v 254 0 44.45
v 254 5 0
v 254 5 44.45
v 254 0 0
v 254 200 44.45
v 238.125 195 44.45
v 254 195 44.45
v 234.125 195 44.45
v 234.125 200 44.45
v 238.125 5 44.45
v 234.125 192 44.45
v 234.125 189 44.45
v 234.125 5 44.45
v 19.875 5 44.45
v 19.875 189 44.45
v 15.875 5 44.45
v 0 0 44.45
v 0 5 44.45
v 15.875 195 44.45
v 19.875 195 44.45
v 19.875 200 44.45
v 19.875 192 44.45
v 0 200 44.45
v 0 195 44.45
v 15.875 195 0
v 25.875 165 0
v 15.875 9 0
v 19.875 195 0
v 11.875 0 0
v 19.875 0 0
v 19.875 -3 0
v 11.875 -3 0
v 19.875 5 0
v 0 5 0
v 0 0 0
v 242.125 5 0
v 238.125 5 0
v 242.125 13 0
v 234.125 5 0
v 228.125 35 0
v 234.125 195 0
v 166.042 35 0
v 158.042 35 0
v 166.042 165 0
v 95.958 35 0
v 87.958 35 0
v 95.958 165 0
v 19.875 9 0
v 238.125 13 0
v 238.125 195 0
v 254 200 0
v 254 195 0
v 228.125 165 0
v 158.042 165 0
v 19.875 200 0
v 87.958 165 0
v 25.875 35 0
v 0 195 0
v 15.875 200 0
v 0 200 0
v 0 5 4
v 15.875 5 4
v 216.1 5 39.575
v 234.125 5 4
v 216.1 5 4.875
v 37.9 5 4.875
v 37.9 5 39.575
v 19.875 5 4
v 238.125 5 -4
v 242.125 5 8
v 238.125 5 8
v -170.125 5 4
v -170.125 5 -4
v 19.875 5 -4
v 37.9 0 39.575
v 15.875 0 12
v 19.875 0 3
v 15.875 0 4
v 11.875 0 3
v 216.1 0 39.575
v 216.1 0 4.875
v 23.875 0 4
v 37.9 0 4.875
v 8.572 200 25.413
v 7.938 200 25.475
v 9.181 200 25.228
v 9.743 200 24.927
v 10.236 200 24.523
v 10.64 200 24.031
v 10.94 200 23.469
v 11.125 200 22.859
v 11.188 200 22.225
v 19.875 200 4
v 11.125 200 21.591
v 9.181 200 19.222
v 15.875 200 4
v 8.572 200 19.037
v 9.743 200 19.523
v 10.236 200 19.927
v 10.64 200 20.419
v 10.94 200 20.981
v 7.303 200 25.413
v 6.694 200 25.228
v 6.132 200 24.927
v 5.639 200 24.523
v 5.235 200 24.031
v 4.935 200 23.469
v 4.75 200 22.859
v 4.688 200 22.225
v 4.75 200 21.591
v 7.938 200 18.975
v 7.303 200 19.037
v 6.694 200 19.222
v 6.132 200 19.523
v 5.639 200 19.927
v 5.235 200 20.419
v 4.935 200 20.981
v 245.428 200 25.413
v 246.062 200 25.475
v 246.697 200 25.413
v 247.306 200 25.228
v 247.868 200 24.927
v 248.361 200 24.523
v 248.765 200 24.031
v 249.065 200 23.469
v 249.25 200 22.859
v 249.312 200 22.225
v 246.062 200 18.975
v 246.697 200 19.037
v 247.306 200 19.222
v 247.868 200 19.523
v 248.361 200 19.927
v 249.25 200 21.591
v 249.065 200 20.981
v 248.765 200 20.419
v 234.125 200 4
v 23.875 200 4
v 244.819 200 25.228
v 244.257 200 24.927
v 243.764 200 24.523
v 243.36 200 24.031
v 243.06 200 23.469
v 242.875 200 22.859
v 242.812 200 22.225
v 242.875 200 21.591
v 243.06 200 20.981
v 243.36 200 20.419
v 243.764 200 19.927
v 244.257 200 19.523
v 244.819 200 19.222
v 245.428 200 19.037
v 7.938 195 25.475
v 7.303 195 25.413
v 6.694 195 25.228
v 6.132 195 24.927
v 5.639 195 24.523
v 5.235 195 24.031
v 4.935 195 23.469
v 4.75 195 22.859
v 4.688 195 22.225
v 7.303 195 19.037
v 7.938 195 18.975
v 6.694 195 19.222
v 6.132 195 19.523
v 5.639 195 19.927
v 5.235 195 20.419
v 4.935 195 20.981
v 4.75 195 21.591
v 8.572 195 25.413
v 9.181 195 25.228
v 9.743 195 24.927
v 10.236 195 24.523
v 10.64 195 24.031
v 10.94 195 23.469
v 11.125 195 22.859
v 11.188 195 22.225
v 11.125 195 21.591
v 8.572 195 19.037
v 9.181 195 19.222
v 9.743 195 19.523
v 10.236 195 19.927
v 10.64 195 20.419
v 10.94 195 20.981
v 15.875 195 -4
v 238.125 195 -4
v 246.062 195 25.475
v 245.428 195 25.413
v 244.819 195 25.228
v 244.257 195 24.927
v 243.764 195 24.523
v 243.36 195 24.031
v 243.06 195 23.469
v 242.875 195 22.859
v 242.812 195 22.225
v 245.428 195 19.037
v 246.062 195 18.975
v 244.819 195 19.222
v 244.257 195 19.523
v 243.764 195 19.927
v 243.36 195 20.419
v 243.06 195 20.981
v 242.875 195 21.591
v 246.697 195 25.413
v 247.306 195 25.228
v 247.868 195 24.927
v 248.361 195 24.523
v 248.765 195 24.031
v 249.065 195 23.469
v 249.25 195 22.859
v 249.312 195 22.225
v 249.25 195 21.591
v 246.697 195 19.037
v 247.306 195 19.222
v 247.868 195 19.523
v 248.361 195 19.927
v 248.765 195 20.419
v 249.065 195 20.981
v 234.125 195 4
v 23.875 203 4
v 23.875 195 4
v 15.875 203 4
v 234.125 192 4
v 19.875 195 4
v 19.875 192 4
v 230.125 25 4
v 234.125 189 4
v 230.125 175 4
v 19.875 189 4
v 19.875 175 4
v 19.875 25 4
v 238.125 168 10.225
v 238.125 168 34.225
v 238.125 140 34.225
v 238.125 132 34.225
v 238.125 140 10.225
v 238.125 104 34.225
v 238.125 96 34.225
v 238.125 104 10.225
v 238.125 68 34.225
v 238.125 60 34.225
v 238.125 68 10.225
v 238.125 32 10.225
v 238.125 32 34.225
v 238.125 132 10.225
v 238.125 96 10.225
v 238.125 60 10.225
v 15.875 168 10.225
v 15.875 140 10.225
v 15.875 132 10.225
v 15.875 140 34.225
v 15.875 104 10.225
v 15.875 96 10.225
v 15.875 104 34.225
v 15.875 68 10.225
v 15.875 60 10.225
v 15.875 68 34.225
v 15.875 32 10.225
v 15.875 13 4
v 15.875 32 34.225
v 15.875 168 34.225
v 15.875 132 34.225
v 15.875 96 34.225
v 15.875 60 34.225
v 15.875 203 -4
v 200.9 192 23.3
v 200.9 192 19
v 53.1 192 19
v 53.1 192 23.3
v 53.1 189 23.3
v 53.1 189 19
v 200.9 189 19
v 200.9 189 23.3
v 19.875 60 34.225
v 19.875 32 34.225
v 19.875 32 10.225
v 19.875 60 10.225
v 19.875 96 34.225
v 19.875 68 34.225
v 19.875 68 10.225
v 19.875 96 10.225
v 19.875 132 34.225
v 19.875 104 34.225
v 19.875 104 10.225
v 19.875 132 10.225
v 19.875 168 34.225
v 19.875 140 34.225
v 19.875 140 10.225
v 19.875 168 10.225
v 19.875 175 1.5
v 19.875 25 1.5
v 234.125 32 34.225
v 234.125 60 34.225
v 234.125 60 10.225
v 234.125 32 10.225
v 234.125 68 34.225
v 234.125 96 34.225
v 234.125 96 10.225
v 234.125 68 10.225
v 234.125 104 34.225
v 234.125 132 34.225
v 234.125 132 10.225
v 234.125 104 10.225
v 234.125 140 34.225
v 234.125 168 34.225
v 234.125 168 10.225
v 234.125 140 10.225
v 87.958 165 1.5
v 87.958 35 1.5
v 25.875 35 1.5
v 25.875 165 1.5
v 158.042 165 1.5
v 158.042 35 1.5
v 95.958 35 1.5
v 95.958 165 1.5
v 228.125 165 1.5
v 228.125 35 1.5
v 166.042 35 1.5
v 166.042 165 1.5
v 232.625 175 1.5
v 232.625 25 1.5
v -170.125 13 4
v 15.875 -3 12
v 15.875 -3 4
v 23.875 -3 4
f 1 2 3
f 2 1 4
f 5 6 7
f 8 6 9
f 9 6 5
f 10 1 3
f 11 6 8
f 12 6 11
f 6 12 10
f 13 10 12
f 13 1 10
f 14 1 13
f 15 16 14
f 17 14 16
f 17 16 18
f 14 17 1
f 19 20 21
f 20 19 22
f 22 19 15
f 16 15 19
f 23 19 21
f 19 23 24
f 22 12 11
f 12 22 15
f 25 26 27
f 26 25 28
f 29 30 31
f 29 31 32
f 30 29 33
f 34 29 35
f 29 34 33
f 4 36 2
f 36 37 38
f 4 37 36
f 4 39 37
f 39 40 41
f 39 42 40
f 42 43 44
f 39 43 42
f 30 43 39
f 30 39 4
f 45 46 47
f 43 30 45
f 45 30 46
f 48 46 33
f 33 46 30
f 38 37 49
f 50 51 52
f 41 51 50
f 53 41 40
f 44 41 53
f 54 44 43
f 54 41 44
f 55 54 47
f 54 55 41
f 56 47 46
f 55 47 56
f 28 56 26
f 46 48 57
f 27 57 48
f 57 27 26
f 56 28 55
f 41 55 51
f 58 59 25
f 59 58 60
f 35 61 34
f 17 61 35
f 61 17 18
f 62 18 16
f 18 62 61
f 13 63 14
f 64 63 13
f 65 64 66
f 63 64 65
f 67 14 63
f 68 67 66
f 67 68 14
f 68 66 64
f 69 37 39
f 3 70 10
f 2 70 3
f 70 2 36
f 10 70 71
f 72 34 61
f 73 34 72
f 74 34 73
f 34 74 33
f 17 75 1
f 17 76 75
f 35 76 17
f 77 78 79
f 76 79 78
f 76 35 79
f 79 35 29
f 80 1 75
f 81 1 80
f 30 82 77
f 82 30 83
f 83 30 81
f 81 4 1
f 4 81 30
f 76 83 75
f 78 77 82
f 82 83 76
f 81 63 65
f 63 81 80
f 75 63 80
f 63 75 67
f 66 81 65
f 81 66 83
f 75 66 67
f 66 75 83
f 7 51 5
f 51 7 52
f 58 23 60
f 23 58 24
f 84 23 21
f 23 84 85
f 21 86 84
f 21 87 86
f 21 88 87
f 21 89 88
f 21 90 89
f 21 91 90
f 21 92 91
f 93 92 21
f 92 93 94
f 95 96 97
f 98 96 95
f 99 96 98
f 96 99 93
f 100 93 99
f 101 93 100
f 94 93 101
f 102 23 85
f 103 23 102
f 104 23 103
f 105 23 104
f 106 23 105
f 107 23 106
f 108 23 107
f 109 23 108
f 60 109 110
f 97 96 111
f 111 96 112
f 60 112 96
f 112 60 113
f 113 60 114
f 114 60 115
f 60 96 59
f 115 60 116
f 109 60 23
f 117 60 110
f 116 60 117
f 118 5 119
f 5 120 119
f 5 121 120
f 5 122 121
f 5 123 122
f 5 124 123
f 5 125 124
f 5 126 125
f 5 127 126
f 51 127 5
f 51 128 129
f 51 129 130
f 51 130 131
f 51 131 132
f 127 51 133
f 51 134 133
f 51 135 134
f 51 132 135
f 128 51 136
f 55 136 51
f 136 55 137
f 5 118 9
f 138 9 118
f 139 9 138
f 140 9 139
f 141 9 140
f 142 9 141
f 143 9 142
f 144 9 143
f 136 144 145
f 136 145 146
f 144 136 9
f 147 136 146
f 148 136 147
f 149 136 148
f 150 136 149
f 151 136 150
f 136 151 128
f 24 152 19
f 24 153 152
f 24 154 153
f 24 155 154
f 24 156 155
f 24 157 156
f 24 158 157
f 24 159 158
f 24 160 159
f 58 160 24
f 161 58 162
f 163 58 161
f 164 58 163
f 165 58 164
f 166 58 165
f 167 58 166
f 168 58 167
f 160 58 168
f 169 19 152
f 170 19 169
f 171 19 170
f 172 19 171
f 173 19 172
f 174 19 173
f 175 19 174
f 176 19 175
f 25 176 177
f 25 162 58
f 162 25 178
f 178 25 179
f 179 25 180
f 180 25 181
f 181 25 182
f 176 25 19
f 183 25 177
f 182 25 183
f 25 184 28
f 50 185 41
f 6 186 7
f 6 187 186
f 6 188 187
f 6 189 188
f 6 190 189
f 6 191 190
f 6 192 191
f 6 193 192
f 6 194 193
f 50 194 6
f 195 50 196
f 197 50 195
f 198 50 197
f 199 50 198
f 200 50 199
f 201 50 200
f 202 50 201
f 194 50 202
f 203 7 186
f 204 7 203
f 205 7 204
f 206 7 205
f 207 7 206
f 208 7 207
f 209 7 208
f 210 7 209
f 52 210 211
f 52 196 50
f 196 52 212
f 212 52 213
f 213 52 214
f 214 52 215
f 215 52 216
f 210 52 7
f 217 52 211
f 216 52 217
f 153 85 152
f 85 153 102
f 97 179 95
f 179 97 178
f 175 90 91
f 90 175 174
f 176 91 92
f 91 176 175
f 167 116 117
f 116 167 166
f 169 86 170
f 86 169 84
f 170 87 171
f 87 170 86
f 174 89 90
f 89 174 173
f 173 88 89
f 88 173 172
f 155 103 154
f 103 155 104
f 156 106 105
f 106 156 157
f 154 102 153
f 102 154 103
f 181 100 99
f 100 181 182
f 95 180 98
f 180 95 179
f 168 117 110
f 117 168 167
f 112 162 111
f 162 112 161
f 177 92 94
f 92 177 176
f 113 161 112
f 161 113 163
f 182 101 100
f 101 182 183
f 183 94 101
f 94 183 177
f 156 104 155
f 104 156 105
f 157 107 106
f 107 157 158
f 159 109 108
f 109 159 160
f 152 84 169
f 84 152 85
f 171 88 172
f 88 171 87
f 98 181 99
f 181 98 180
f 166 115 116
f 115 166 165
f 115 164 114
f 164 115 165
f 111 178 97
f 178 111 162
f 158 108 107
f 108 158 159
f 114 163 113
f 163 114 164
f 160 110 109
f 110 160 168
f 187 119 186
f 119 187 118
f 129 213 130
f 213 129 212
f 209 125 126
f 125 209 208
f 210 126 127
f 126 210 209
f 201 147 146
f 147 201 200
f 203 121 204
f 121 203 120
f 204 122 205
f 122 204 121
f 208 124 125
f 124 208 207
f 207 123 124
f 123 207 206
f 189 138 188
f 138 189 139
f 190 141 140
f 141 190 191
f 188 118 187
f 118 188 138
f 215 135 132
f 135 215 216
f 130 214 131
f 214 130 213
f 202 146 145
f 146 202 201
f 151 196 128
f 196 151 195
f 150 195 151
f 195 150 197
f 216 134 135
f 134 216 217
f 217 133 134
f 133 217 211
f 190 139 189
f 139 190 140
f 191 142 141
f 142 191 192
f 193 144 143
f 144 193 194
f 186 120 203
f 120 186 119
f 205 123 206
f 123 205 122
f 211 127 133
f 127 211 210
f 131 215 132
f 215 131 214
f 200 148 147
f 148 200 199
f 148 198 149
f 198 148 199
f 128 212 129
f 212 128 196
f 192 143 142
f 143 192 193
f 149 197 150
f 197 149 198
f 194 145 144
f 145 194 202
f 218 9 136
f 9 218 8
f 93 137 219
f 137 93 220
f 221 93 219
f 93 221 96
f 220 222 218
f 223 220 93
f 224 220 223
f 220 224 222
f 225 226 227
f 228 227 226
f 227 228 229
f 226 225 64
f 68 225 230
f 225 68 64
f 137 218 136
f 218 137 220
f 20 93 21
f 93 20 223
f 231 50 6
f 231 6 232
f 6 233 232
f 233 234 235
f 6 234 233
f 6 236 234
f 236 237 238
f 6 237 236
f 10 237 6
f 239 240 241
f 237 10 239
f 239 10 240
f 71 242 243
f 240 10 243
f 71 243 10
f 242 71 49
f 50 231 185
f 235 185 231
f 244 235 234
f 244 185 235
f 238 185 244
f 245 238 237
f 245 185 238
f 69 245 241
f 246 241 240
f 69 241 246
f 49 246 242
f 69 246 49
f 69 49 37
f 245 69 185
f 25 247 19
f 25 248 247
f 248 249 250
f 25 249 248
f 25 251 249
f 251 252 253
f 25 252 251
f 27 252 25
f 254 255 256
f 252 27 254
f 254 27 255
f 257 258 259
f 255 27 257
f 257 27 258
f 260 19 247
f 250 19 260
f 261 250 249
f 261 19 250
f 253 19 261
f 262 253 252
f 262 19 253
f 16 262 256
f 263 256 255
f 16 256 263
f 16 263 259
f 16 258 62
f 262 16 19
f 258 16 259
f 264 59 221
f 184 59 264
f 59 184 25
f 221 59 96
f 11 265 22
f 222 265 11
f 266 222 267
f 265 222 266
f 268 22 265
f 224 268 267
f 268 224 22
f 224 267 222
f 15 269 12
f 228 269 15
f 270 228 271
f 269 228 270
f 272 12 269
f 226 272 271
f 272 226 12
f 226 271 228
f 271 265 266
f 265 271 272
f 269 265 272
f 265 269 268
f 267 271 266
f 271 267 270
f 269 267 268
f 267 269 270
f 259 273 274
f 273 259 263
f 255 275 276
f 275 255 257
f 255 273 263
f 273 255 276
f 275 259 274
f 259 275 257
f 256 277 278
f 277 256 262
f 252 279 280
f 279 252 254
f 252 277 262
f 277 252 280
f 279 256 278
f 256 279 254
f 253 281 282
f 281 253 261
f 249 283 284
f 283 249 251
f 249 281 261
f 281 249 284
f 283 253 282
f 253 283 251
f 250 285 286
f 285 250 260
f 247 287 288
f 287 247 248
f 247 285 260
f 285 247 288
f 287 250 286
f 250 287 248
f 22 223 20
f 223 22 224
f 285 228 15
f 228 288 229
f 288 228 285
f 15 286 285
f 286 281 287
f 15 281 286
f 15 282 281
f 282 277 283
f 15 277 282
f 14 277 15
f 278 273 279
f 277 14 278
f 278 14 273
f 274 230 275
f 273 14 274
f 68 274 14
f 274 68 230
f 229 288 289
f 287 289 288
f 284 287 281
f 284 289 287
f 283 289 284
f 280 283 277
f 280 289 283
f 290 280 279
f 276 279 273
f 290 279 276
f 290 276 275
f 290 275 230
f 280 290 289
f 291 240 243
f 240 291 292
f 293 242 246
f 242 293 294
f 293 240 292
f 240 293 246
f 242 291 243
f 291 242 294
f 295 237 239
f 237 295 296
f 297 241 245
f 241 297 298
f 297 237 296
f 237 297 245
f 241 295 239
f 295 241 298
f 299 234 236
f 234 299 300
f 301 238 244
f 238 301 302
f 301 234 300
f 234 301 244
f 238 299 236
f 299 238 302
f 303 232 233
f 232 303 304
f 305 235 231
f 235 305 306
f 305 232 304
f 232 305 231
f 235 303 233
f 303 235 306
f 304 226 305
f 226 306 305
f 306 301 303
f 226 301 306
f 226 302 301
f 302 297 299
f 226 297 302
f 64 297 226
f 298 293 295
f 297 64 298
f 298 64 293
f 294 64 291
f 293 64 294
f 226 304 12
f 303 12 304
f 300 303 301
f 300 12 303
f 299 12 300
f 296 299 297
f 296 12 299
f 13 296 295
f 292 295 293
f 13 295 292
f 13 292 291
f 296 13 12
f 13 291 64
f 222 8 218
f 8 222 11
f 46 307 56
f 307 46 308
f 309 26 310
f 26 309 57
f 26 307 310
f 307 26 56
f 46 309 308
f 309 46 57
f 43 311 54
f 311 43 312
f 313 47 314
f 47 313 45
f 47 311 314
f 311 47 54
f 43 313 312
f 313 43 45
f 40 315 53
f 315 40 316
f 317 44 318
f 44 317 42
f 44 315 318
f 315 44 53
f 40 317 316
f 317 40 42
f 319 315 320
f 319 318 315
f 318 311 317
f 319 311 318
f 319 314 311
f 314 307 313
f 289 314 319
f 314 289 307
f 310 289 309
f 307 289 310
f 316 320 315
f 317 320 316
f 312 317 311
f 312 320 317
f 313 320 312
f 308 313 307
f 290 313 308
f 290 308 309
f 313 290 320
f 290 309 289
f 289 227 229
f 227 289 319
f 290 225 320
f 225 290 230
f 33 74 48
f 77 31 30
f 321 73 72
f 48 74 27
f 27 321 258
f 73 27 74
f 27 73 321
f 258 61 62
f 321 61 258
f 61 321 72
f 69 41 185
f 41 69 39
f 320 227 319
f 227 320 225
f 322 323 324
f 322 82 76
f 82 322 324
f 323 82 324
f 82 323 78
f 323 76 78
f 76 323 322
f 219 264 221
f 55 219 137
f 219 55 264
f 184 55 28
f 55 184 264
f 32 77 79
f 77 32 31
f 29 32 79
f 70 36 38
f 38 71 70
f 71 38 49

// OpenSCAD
// ============================================================
// Lenovo ThinkCentre M93 Tiny — 10" Rack Mount (1U, 4-post) v3
// v2 + retention wall behind M93 with large central cutout
// Single print, no supports required (print faceplate-face-down)
// ============================================================

// --- Rack dimensions ---
rack_width         = 254.0;
rack_usable_width  = 222.25;
rack_1u_height     = 44.45;
post_depth         = 200.0;

// --- M93 Tiny dimensions (on its side) ---
m93_w              = 177.8;
m93_h              = 34.3;
m93_d              = 182.0;

// --- Wall / structure thicknesses ---
wall_t             = 4.0;
face_t             = 5.0;
rear_t             = 5.0;
ret_t              = 3.0;    // retention wall thickness
gusset_r           = 8.0;

// --- Retention wall position ---
// M93 rear face is at: face_t + m93_d = 5 + 182 = 187mm
// Add 2mm gap → retention wall front face at 189mm
ret_gap            = 2.0;
ret_y              = face_t + m93_d + ret_gap;  // 189mm from origin

// --- Retention wall cutout (large central rectangle, 15mm border) ---
ret_border         = 15.0;
// Cutout is relative to the M93 footprint projected onto the wall
// M93 is centred left-right within usable width
m93_x_centre       = rack_width / 2;
m93_x_left         = m93_x_centre - m93_w / 2;   // left edge of M93
// Cutout: inset ret_border from each side of M93 footprint
ret_cut_x          = m93_x_left + ret_border;
ret_cut_w          = m93_w - 2 * ret_border;
// Vertically: M93 sits on floor (wall_t from bottom), height = m93_h
ret_cut_z          = wall_t + ret_border;
ret_cut_h          = m93_h - 2 * ret_border;

// --- Floor thinning ---
floor_edge_rib     = 20.0;
floor_thin_t       = 1.5;
floor_recess_d     = wall_t - floor_thin_t;  // 2.5mm

// --- Floor lightening slots ---
floor_slot_count   = 3;
floor_slot_margin  = 10.0;
floor_rib_w        = 8.0;

// --- Side wall slots ---
wall_slot_h        = 24.0;
wall_slot_w        = 28.0;
wall_slot_rib      = 8.0;
wall_slot_margin   = 12.0;
wall_slot_z        = (rack_1u_height - wall_slot_h) / 2;

// --- Mounting holes ---
m6_hole_d          = 6.5;
ear_w              = (rack_width - rack_usable_width) / 2;  // 15.875
hole_x             = ear_w / 2;
hole_y             = rack_1u_height / 2;

// --- Derived ---
inner_w            = rack_usable_width - 2 * wall_t;
tray_run           = post_depth - face_t - rear_t;  // 190mm

// ============================================================
// MODULES
// ============================================================

module rack_ear(side) {
    translate([side == 1 ? rack_width - ear_w : 0, 0, 0])
    difference() {
        cube([ear_w, face_t, rack_1u_height]);
        translate([hole_x, face_t / 2, hole_y])
        rotate([90, 0, 0])
        cylinder(d = m6_hole_d, h = face_t + 1, center = true, $fn = 32);
    }
}

module rear_crossbar() {
    translate([0, post_depth - rear_t, 0])
    difference() {
        cube([rack_width, rear_t, rack_1u_height]);
        // Left M6 hole
        translate([hole_x, rear_t / 2, hole_y])
        rotate([90, 0, 0])
        cylinder(d = m6_hole_d, h = rear_t + 1, center = true, $fn = 32);
        // Right M6 hole
        translate([rack_width - hole_x, rear_t / 2, hole_y])
        rotate([90, 0, 0])
        cylinder(d = m6_hole_d, h = rear_t + 1, center = true, $fn = 32);
        // Open middle between side walls
        translate([ear_w + wall_t, -0.1, wall_t])
        cube([
            rack_usable_width - 2 * wall_t,
            rear_t + 0.2,
            rack_1u_height - wall_t + 0.1
        ]);
    }
}

module faceplate() {
    cutout_w = m93_w + 0.4;
    cutout_h = m93_h + 0.4;
    cutout_x = (rack_width - cutout_w) / 2;
    cutout_z = (rack_1u_height - cutout_h) / 2;

    difference() {
        cube([rack_width, face_t, rack_1u_height]);
        translate([cutout_x, -0.1, cutout_z])
        cube([cutout_w, face_t + 0.2, cutout_h]);
    }
}

module retention_wall() {
    // Spans between the two side walls (usable width), full 1U height
    // Has a large central cutout leaving a 15mm border around the M93 rear face
    translate([ear_w, ret_y, 0])
    difference() {
        cube([rack_usable_width, ret_t, rack_1u_height]);
        // Large central cutout — coords relative to this translate
        translate([ret_cut_x - ear_w, -0.1, ret_cut_z])
        cube([ret_cut_w, ret_t + 0.2, ret_cut_h]);
    }
}

module side_wall_slotted(side) {
    x_pos = (side == 0) ? ear_w : rack_width - ear_w - wall_t;
    slot_run = tray_run - 2 * wall_slot_margin;
    n_slots = floor((slot_run + wall_slot_rib) / (wall_slot_w + wall_slot_rib));
    total_slot_w = n_slots * wall_slot_w + (n_slots - 1) * wall_slot_rib;
    slot_start_y = face_t + wall_slot_margin + (slot_run - total_slot_w) / 2;

    translate([x_pos, face_t, 0])
    difference() {
        cube([wall_t, tray_run, rack_1u_height]);
        for (i = [0 : n_slots - 1]) {
            translate([
                -0.1,
                slot_start_y - face_t + i * (wall_slot_w + wall_slot_rib),
                wall_slot_z
            ])
            cube([wall_t + 0.2, wall_slot_w, wall_slot_h]);
        }
    }
}

module floor_panel_optimised() {
    floor_x    = ear_w;
    floor_y    = face_t;
    floor_w    = rack_usable_width;
    floor_full = tray_run;

    recess_y_start = floor_edge_rib;
    recess_y_len   = floor_full - 2 * floor_edge_rib;

    slot_zone_w         = floor_w - 2 * floor_slot_margin;
    total_slot_w_floor  = slot_zone_w - (floor_slot_count - 1) * floor_rib_w;
    slot_w_each         = total_slot_w_floor / floor_slot_count;
    slot_x_start        = floor_slot_margin;

    translate([floor_x, floor_y, 0])
    difference() {
        cube([floor_w, floor_full, wall_t]);

        // Centre recess
        translate([-0.1, recess_y_start, floor_thin_t])
        cube([floor_w + 0.2, recess_y_len, floor_recess_d + 0.1]);

        // Lightening slots
        for (i = [0 : floor_slot_count - 1]) {
            slot_x = slot_x_start + i * (slot_w_each + floor_rib_w);
            translate([slot_x, recess_y_start + 10, -0.1])
            cube([slot_w_each, recess_y_len - 20, wall_t + 0.2]);
        }
    }
}

module gussets() {
    // Floor-to-left-wall
    translate([ear_w + wall_t, face_t, wall_t])
    rotate([0, -90, 0])
    rotate([0, 0, 90])
    linear_extrude(height = tray_run)
    polygon(points = [[0,0],[gusset_r,0],[0,gusset_r]]);

    // Floor-to-right-wall
    translate([rack_width - ear_w, face_t, wall_t])
    rotate([0, 0, 90])
    rotate([0, 90, 0])
    linear_extrude(height = tray_run)
    polygon(points = [[0,0],[gusset_r,0],[0,gusset_r]]);

    // Faceplate-to-floor
    translate([ear_w, face_t, wall_t])
    rotate([90, 0, 0])
    linear_extrude(height = gusset_r)
    polygon(points = [[0,0],[gusset_r,0],[0,gusset_r]]);

    // Rear-to-floor
    translate([ear_w, post_depth - rear_t, wall_t])
    rotate([-90, 0, 0])
    linear_extrude(height = gusset_r)
    polygon(points = [[0,0],[gusset_r,0],[0,gusset_r]]);

    // Faceplate-to-left-wall
    translate([ear_w + wall_t, face_t, 0])
    rotate([90, 0, -90])
    linear_extrude(height = gusset_r)
    polygon(points = [[0,0],[gusset_r,0],[0,gusset_r]]);

    // Faceplate-to-right-wall
    translate([rack_width - ear_w - wall_t, face_t, 0])
    rotate([90, 0, 90])
    linear_extrude(height = gusset_r)
    polygon(points = [[0,0],[gusset_r,0],[0,gusset_r]]);
}

// ============================================================
// ASSEMBLY
// ============================================================

union() {
    faceplate();
    rack_ear(0);
    rack_ear(1);
    rear_crossbar();
    retention_wall();
    side_wall_slotted(0);
    side_wall_slotted(1);
    floor_panel_optimised();
    gussets();
}

// ============================================================
// PREVIEW GHOST: M93 unit position
// ============================================================
/*
%translate([
    ear_w + wall_t + (inner_w - m93_w) / 2,
    face_t,
    wall_t
])
cube([m93_w, m93_d, m93_h]);
*/
